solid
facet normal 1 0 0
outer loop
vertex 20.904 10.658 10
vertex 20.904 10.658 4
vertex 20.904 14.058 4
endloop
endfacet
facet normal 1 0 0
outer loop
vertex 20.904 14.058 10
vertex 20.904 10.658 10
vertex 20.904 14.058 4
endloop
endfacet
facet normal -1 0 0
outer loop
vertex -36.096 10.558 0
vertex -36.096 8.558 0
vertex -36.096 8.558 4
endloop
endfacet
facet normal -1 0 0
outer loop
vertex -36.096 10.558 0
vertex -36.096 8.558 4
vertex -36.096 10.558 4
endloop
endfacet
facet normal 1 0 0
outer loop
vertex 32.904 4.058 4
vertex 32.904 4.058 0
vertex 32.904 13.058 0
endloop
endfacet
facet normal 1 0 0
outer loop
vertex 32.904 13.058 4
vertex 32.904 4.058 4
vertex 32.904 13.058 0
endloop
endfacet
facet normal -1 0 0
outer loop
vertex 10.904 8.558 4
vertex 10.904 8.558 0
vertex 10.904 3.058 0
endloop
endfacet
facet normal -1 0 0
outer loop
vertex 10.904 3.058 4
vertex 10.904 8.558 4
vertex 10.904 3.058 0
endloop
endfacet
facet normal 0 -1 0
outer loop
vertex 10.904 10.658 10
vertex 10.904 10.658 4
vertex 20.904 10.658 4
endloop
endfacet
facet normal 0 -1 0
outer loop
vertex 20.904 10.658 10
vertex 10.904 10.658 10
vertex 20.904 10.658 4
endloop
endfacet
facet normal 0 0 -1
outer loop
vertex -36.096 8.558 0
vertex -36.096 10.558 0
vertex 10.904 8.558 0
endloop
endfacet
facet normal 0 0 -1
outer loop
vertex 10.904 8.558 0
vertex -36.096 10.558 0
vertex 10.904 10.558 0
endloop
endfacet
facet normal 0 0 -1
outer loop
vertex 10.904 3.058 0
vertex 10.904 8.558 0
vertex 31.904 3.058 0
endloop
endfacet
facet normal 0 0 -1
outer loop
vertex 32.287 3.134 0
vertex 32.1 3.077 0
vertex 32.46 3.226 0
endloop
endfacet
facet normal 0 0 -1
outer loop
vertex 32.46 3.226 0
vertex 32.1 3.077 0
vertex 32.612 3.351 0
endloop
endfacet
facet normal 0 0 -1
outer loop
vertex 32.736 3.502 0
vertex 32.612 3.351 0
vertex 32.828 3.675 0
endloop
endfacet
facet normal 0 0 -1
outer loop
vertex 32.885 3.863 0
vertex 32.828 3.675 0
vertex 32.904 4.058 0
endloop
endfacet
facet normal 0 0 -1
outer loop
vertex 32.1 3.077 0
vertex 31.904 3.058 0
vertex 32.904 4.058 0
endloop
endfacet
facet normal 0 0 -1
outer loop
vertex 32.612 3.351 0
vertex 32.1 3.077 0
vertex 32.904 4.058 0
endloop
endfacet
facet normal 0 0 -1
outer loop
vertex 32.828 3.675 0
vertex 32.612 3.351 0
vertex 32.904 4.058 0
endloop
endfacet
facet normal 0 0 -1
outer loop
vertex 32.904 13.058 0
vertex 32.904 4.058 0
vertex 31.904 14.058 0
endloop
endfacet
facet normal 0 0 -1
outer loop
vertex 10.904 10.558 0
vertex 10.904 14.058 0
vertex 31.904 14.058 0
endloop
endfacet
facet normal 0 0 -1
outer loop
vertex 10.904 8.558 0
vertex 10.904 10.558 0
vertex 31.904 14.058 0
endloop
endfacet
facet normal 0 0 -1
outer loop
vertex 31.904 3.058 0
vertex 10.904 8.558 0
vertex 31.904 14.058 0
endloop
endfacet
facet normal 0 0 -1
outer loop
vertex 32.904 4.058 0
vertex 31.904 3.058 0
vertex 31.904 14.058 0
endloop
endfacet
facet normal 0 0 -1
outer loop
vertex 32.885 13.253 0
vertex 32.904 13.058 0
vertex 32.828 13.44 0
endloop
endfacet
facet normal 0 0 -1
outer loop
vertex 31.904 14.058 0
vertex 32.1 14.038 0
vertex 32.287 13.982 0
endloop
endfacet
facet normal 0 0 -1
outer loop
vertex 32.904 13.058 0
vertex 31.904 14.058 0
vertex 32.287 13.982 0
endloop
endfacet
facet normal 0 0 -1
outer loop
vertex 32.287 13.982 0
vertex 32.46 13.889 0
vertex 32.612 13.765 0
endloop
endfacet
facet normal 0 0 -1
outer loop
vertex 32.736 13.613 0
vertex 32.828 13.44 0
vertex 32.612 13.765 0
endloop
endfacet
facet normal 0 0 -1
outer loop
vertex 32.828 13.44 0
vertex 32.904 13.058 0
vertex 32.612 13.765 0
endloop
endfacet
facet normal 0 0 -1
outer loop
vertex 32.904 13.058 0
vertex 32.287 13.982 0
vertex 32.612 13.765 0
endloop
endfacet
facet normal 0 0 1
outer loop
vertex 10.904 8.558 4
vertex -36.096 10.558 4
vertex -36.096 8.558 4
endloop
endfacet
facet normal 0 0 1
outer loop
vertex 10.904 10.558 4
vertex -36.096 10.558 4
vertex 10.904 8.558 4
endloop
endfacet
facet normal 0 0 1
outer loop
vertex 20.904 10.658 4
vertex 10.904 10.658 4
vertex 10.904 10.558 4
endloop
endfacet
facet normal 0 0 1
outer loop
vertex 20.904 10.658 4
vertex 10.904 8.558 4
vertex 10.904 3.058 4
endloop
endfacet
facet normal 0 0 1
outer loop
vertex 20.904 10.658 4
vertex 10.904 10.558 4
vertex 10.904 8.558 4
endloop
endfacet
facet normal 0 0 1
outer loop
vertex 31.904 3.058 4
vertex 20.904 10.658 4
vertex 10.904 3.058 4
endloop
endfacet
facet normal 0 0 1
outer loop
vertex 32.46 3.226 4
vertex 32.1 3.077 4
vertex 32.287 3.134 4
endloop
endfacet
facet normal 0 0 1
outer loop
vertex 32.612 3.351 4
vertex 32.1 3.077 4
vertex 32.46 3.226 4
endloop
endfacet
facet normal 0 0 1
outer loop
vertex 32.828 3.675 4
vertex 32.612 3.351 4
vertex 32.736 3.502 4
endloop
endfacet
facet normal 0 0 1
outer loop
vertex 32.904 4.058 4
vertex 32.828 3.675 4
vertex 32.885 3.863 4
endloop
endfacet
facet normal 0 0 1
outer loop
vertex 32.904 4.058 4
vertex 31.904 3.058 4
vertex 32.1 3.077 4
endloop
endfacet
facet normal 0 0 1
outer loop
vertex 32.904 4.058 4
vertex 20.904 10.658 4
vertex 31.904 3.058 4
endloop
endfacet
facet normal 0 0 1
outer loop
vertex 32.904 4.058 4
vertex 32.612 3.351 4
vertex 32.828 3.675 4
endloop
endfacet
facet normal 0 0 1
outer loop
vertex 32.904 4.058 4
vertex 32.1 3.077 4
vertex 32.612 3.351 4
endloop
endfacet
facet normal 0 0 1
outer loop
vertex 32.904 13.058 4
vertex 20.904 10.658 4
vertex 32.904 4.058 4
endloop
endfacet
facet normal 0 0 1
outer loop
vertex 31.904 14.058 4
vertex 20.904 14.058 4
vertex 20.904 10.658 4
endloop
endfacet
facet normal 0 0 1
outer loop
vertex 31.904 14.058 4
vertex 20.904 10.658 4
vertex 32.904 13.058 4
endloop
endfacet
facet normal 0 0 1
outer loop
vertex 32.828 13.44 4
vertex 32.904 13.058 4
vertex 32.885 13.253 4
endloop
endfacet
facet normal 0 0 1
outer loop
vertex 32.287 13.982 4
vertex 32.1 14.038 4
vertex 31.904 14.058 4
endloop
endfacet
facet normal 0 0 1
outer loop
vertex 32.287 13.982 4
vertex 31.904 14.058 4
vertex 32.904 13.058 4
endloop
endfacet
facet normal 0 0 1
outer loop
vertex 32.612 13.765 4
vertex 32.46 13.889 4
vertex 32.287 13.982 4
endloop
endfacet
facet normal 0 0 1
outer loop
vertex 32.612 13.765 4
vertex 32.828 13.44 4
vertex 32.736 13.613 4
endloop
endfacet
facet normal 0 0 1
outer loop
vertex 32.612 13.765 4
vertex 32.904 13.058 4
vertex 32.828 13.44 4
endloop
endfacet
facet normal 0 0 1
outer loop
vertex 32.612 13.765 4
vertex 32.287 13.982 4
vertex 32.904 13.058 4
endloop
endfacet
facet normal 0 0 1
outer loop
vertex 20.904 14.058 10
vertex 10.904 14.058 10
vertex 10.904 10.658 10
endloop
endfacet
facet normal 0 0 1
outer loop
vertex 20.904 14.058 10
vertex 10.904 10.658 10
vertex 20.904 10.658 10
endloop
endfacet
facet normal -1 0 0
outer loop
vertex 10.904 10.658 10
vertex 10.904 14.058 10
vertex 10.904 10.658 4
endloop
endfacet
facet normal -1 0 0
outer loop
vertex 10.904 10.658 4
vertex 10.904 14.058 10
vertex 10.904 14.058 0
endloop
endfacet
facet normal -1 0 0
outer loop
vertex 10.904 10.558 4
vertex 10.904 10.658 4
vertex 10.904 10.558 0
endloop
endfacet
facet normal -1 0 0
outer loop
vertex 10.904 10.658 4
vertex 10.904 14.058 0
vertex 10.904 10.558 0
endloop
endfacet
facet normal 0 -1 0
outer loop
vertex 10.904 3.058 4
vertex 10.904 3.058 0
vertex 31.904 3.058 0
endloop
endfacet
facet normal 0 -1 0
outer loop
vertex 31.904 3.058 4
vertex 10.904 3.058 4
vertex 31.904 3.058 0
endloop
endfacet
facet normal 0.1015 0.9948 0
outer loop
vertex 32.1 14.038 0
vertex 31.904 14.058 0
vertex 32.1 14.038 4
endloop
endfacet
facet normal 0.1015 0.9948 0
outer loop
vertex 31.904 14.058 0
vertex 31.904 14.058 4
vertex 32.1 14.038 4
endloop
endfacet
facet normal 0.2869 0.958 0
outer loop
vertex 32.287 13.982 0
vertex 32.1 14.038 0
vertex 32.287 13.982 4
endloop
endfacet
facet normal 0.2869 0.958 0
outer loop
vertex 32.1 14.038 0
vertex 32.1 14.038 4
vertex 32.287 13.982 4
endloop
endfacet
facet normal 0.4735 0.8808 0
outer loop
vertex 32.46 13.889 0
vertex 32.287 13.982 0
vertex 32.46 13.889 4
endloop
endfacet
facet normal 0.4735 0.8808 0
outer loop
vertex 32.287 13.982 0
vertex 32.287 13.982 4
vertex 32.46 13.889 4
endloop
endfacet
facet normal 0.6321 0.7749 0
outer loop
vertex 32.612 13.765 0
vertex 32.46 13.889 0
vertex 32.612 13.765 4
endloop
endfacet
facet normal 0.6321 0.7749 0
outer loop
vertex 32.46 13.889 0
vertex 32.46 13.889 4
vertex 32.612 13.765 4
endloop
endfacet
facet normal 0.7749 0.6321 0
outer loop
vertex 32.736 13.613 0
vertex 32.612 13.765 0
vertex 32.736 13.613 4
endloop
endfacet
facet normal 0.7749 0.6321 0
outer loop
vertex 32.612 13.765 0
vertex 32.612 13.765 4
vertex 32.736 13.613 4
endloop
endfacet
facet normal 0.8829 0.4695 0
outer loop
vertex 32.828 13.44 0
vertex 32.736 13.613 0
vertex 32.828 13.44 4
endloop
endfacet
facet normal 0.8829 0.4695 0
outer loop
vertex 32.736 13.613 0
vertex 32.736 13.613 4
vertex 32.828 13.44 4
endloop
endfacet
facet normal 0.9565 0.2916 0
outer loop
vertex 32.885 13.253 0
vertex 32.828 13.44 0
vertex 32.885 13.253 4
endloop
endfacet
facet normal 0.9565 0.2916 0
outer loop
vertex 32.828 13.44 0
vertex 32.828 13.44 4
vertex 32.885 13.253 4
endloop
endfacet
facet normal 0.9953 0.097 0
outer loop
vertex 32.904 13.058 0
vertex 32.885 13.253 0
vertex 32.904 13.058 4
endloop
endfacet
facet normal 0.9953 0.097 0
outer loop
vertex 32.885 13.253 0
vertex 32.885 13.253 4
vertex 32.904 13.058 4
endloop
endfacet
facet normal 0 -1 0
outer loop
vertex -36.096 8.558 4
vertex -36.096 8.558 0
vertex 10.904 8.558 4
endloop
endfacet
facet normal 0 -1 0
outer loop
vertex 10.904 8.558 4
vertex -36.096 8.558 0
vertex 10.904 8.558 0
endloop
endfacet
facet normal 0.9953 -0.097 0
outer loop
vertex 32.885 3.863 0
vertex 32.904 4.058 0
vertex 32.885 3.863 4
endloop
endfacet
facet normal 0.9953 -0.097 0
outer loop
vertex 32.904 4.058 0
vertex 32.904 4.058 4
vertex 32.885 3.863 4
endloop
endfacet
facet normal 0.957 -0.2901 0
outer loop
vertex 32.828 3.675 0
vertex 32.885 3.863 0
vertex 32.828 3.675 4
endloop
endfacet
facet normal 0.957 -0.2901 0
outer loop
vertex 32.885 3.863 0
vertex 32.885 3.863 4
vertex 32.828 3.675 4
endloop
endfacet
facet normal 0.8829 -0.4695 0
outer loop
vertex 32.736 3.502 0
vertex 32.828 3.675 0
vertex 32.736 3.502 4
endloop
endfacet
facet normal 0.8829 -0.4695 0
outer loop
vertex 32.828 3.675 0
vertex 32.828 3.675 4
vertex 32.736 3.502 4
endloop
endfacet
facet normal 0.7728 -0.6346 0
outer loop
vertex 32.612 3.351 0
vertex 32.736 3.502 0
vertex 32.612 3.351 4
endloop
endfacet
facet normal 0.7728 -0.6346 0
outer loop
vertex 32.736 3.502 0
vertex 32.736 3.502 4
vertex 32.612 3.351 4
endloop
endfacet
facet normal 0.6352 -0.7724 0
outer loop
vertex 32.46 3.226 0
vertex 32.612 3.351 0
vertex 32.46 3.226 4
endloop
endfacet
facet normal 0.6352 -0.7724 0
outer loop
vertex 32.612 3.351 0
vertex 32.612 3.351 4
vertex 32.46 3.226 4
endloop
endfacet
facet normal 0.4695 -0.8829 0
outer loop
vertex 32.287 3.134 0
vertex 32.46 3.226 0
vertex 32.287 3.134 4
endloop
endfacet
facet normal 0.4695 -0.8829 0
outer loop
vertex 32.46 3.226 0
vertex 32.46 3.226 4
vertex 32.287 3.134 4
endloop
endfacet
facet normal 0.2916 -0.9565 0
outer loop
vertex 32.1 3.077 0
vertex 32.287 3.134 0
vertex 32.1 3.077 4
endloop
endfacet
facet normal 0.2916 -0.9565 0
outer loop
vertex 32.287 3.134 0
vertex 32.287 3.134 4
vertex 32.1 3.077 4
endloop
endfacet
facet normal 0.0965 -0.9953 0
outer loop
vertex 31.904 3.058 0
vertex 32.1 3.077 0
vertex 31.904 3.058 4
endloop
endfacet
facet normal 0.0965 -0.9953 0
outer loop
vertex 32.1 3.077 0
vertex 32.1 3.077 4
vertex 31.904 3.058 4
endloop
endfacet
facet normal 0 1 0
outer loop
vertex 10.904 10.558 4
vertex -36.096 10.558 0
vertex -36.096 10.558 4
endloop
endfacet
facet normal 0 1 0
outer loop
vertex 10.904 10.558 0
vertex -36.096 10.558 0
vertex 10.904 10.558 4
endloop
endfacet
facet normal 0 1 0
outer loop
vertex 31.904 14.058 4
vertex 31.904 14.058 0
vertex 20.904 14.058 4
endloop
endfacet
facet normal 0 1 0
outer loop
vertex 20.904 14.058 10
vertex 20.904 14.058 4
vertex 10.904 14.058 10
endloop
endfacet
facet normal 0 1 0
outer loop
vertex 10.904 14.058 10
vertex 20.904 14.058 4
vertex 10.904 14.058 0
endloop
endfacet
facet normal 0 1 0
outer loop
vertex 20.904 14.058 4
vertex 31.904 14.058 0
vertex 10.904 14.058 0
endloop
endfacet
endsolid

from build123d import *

# Parameters (mm, degrees)
F0_W     = 47
F0_H     = 2
F0_W_2   = 10
F0_H_2   = 3.4
F1_DEPTH = 4
F2_DEPTH = 10
F3_R     = 1


with BuildPart() as f1:
    # F0 (on Top) → F1 (new body)
    with BuildSketch(Plane.XY):
        with Locations((-12.59553, 9.557682)):
            Rectangle(F0_W, F0_H)
        Polygon((10.90447, 10.657682), (10.90447, 10.557682), (10.90447, 8.557682), (10.90447, 3.057682), (32.90447, 3.057682), (32.90447, 14.057682), (20.90447, 14.057682), (20.90447, 10.657682), align=None)
        with Locations((15.90447, 12.357682)):
            Rectangle(F0_W_2, F0_H_2)
    extrude(amount=F1_DEPTH)

    # F0 (on Top) → F2 (join)
    with BuildSketch(Plane.XY):
        with Locations((15.90447, 12.357682)):
            Rectangle(F0_W_2, F0_H_2)
    extrude(amount=F2_DEPTH)

    # F3
    f3_edges = [f1.edges().sort_by_distance(p)[0] for p in [
        (32.90447, 3.057682, 2),
        (32.90447, 14.057682, 2),
    ]]
    fillet(f3_edges, radius=F3_R)


solid = f1.part
